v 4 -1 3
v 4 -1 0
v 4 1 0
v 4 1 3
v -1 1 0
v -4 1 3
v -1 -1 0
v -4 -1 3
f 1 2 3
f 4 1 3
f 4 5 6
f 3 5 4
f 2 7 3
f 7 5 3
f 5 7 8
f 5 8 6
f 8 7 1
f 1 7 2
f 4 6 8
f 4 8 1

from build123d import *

# Parameters (mm, degrees)
F0_W     = 8
F0_H     = 2
F1_DEPTH = 3
F2_SIZE  = 2.99999


# Not quite as in the source:
# - a fillet or chamfer is up to 0.001 mm smaller than in the source, because OpenCascade refuses the exact size


with BuildPart() as f1:
    # F0 (on Top) → F1 (new body)
    with BuildSketch(Plane.XY):
        Rectangle(F0_W, F0_H)
    extrude(amount=F1_DEPTH)

    # F2 (size 3 in the source; OpenCascade refuses exactly that, so slightly less here)
    f2_edges = [f1.edges().sort_by_distance(p)[0] for p in [
        (-4, 0, 0),
    ]]
    chamfer(f2_edges, length=F2_SIZE)


solid = f1.part
